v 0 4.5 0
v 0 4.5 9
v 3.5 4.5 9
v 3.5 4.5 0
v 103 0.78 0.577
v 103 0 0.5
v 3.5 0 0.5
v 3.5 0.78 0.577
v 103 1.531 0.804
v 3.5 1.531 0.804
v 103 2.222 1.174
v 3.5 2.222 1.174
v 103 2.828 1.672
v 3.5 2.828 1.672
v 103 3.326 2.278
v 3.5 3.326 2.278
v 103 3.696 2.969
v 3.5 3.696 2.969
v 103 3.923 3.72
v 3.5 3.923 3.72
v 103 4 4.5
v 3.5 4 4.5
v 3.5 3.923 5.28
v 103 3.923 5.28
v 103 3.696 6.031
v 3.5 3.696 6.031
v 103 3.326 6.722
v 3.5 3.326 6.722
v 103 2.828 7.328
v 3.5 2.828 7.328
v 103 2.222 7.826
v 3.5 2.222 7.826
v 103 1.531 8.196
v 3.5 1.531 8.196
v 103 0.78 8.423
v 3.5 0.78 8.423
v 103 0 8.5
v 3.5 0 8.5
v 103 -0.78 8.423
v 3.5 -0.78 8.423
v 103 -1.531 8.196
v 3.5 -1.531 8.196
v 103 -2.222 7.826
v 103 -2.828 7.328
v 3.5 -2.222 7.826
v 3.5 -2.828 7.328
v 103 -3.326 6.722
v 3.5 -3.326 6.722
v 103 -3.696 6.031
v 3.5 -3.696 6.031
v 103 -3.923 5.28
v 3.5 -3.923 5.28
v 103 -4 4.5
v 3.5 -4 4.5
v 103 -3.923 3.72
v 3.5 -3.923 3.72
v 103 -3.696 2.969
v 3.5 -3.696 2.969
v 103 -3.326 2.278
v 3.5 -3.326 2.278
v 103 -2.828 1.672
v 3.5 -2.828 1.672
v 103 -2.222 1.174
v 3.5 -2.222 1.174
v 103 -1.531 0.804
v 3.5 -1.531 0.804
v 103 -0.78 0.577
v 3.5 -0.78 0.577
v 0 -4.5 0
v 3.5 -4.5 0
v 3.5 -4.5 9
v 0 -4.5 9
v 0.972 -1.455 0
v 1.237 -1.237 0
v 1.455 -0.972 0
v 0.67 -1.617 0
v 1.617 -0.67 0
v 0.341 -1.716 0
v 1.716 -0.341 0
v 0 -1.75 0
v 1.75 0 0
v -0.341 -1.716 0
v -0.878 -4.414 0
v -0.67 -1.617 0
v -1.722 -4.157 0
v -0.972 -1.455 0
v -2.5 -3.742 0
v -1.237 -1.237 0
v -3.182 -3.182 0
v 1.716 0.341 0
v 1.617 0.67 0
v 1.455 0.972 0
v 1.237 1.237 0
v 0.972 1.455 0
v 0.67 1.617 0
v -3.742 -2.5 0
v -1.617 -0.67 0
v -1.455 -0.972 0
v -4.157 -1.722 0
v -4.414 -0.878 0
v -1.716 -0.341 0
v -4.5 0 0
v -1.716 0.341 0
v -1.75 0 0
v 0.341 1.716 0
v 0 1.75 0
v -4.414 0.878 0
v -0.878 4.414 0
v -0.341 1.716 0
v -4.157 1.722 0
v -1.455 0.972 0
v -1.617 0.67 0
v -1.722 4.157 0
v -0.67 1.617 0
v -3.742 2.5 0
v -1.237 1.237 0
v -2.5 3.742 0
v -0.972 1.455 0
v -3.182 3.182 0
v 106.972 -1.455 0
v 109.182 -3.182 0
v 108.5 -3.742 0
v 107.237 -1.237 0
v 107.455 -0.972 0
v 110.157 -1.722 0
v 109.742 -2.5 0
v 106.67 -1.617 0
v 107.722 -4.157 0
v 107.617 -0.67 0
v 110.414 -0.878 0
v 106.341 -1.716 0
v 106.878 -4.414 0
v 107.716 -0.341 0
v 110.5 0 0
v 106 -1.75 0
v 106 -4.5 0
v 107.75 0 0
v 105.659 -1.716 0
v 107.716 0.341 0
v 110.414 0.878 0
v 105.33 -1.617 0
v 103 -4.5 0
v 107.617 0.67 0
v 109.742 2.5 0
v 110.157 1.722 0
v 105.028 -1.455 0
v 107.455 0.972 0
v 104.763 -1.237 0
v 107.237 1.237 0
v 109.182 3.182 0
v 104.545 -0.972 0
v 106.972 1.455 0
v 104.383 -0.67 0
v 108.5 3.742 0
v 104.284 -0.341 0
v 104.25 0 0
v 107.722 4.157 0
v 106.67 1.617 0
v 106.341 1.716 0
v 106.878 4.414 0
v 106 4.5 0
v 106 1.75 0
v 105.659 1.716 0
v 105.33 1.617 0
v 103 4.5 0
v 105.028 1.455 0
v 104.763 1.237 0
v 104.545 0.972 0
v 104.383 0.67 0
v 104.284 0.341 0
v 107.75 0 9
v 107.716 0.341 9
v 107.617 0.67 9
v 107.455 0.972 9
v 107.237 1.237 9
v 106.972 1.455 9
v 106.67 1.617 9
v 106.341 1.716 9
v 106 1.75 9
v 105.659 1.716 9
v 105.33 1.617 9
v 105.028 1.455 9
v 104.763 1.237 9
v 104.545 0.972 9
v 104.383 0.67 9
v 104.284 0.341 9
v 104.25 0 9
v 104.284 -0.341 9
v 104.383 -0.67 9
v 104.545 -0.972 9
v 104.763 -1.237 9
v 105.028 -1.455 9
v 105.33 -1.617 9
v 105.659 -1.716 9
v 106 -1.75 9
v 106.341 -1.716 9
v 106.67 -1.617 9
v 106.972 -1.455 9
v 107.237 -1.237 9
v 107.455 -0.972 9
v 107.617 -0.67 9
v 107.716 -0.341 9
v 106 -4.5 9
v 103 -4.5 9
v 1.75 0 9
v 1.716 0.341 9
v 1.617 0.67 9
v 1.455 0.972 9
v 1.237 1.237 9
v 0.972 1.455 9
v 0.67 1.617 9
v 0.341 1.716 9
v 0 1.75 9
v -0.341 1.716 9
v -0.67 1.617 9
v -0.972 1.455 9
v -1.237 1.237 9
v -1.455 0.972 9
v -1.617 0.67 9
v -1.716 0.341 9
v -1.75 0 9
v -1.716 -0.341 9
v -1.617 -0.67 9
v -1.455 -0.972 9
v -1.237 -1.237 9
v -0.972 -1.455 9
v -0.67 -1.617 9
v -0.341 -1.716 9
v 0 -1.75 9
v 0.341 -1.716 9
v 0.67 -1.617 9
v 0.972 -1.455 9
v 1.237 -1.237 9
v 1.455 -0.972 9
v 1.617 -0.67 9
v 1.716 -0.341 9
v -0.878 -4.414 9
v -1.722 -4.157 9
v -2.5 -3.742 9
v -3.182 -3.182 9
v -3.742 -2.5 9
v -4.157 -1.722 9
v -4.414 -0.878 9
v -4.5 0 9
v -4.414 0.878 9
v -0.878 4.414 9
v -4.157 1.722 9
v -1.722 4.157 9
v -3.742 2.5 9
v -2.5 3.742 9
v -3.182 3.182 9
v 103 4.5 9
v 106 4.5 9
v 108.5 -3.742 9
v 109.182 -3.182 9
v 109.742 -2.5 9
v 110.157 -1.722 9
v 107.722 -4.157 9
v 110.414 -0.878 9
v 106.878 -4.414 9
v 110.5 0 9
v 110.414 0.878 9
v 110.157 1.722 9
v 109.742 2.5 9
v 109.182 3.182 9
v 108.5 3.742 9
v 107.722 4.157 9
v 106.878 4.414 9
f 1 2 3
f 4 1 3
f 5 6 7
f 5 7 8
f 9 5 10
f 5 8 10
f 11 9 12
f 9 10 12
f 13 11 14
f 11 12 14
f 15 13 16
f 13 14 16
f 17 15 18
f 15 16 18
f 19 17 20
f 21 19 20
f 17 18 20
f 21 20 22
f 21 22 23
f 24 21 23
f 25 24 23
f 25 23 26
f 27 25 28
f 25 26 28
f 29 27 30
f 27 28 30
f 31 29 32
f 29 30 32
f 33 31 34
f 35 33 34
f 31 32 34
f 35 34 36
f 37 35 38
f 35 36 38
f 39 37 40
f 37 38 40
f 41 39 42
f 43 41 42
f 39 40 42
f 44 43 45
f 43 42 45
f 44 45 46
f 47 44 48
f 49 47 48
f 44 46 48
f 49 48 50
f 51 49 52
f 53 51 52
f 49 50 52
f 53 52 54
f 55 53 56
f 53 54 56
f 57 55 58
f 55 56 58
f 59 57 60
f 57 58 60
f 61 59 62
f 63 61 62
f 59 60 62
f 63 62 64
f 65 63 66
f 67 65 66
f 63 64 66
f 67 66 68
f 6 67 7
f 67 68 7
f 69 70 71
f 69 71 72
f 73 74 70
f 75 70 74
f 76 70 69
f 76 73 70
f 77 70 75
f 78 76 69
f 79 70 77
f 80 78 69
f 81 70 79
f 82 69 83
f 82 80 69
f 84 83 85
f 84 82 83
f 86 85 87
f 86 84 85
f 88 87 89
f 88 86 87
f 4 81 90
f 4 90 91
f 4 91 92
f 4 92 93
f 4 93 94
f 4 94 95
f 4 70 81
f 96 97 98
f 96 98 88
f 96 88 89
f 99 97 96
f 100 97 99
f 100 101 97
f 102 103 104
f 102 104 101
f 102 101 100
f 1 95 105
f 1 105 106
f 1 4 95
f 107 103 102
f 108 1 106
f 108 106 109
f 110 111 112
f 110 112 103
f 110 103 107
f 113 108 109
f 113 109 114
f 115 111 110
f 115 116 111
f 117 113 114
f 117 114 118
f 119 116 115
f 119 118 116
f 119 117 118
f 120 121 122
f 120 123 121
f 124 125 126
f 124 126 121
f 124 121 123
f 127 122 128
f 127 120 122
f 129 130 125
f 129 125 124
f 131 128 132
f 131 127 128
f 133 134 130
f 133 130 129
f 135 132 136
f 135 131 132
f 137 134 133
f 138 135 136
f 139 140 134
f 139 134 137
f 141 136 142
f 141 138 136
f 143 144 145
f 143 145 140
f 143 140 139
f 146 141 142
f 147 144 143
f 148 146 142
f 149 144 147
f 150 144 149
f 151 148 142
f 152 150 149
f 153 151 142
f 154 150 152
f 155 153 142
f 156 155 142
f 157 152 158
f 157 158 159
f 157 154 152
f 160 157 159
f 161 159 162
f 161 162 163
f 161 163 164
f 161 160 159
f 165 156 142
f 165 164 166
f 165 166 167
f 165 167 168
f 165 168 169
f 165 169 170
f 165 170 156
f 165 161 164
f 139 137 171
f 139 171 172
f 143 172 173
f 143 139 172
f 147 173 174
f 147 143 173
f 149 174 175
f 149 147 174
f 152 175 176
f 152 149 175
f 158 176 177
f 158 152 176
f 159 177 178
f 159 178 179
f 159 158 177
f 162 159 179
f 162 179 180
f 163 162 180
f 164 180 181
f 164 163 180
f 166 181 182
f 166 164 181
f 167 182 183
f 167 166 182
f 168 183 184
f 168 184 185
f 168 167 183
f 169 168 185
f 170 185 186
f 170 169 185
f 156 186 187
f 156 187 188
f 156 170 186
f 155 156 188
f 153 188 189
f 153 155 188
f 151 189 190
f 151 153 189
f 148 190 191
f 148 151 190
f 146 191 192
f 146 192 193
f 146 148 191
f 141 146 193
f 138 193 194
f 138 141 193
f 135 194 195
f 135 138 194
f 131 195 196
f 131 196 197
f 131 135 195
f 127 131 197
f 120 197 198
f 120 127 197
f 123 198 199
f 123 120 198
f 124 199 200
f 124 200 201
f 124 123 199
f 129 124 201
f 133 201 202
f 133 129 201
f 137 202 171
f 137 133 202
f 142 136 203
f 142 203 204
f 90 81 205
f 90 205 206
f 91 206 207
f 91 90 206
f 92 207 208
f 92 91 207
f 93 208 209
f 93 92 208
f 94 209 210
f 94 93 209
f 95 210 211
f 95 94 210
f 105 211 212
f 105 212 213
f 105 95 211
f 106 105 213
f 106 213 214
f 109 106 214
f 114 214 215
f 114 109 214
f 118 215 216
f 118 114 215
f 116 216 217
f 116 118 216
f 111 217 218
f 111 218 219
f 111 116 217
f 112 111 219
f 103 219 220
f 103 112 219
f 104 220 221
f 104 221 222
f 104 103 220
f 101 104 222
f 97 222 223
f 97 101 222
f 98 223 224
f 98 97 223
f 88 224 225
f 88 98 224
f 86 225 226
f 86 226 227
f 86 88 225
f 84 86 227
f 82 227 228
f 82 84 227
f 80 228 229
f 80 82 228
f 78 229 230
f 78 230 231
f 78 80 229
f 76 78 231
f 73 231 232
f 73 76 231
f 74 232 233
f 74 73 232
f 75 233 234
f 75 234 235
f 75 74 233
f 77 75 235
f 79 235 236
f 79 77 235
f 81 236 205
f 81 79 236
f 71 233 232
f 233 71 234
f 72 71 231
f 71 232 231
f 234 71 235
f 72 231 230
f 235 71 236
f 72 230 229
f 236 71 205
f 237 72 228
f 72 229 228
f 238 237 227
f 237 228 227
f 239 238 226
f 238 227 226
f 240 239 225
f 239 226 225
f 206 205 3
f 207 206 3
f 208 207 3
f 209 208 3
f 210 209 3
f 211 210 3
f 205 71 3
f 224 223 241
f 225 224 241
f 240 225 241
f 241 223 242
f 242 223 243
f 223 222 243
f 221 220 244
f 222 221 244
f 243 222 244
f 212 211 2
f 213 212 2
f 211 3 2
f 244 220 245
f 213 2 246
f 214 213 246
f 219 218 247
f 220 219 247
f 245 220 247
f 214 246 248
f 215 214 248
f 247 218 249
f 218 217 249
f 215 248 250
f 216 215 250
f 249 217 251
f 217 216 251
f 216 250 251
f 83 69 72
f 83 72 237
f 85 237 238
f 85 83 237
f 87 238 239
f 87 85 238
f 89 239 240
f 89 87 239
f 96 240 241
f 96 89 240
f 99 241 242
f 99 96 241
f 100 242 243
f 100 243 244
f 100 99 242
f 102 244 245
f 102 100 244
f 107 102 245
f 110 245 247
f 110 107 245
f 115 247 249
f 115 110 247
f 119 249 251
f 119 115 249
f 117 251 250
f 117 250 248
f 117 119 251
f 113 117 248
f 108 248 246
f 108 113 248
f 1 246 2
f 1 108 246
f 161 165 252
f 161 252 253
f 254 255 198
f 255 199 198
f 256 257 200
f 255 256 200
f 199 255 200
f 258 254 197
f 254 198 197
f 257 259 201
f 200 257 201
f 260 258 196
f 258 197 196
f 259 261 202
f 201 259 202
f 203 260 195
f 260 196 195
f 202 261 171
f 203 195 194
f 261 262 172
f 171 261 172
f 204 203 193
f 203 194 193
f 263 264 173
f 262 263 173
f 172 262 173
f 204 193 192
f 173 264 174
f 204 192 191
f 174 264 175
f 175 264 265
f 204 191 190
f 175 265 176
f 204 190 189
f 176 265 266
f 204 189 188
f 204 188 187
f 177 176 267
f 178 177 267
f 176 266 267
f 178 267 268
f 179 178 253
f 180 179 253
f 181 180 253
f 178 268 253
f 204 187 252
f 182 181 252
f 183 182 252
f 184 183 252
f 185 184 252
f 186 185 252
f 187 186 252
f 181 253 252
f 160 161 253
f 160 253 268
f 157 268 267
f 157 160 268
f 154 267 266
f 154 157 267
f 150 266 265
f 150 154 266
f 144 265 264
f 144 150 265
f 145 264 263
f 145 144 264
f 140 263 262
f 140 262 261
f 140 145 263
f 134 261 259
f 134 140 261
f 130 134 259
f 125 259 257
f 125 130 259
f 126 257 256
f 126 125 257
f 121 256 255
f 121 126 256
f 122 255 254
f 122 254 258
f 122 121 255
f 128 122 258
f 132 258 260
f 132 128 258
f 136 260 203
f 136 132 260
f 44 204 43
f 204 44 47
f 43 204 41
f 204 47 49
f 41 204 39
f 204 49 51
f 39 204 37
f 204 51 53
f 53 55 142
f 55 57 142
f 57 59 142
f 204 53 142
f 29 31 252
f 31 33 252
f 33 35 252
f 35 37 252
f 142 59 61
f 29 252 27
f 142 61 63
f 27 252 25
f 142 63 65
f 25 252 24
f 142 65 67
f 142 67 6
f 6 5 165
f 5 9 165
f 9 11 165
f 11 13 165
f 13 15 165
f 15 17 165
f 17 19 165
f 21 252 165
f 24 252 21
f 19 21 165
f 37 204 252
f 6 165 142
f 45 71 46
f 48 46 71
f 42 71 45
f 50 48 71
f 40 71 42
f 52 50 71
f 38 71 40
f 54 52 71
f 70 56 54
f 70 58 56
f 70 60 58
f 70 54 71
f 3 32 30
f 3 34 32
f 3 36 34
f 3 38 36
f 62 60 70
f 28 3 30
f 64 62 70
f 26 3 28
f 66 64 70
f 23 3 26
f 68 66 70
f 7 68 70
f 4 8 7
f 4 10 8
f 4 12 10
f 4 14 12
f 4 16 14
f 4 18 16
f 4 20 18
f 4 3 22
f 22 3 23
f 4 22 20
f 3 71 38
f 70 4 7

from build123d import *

# Parameters (mm, degrees)
SKETCH5_R           = 1.75
BOSS_EXTRUDE3_DEPTH = 9
CUT_EXTRUDE2_START  = 3.5
SKETCH7_R           = 7.5
SKETCH7_R_2         = 4
CUT_EXTRUDE2_DEPTH  = 99.5


with BuildPart() as part:
    # Sketch5 → Boss-Extrude3 (new body)
    with BuildSketch(Plane.XY):
        with BuildLine():
            Line((0, 4.5), (106, 4.5))
            ThreePointArc((106, 4.5), (110.5, 0), (106, -4.5))
            Line((106, -4.5), (0, -4.5))
            ThreePointArc((0, -4.5), (-4.5, 0), (0, 4.5))
        make_face()
        Circle(SKETCH5_R, mode=Mode.SUBTRACT)
        with Locations((106, 0)):
            Circle(SKETCH5_R, mode=Mode.SUBTRACT)
    extrude(amount=BOSS_EXTRUDE3_DEPTH)

    # Sketch7 → Cut-Extrude2 (cut)
    with BuildSketch(Plane(origin=(0, 0, 0), x_dir=(0, 0, -1), z_dir=(1, 0, 0)).offset(CUT_EXTRUDE2_START)):
        with Locations((-4.5, 0)):
            Circle(SKETCH7_R)
        with Locations((-4.5, 0)):
            Circle(SKETCH7_R_2, mode=Mode.SUBTRACT)
    extrude(amount=CUT_EXTRUDE2_DEPTH, mode=Mode.SUBTRACT)


solid = part.part
